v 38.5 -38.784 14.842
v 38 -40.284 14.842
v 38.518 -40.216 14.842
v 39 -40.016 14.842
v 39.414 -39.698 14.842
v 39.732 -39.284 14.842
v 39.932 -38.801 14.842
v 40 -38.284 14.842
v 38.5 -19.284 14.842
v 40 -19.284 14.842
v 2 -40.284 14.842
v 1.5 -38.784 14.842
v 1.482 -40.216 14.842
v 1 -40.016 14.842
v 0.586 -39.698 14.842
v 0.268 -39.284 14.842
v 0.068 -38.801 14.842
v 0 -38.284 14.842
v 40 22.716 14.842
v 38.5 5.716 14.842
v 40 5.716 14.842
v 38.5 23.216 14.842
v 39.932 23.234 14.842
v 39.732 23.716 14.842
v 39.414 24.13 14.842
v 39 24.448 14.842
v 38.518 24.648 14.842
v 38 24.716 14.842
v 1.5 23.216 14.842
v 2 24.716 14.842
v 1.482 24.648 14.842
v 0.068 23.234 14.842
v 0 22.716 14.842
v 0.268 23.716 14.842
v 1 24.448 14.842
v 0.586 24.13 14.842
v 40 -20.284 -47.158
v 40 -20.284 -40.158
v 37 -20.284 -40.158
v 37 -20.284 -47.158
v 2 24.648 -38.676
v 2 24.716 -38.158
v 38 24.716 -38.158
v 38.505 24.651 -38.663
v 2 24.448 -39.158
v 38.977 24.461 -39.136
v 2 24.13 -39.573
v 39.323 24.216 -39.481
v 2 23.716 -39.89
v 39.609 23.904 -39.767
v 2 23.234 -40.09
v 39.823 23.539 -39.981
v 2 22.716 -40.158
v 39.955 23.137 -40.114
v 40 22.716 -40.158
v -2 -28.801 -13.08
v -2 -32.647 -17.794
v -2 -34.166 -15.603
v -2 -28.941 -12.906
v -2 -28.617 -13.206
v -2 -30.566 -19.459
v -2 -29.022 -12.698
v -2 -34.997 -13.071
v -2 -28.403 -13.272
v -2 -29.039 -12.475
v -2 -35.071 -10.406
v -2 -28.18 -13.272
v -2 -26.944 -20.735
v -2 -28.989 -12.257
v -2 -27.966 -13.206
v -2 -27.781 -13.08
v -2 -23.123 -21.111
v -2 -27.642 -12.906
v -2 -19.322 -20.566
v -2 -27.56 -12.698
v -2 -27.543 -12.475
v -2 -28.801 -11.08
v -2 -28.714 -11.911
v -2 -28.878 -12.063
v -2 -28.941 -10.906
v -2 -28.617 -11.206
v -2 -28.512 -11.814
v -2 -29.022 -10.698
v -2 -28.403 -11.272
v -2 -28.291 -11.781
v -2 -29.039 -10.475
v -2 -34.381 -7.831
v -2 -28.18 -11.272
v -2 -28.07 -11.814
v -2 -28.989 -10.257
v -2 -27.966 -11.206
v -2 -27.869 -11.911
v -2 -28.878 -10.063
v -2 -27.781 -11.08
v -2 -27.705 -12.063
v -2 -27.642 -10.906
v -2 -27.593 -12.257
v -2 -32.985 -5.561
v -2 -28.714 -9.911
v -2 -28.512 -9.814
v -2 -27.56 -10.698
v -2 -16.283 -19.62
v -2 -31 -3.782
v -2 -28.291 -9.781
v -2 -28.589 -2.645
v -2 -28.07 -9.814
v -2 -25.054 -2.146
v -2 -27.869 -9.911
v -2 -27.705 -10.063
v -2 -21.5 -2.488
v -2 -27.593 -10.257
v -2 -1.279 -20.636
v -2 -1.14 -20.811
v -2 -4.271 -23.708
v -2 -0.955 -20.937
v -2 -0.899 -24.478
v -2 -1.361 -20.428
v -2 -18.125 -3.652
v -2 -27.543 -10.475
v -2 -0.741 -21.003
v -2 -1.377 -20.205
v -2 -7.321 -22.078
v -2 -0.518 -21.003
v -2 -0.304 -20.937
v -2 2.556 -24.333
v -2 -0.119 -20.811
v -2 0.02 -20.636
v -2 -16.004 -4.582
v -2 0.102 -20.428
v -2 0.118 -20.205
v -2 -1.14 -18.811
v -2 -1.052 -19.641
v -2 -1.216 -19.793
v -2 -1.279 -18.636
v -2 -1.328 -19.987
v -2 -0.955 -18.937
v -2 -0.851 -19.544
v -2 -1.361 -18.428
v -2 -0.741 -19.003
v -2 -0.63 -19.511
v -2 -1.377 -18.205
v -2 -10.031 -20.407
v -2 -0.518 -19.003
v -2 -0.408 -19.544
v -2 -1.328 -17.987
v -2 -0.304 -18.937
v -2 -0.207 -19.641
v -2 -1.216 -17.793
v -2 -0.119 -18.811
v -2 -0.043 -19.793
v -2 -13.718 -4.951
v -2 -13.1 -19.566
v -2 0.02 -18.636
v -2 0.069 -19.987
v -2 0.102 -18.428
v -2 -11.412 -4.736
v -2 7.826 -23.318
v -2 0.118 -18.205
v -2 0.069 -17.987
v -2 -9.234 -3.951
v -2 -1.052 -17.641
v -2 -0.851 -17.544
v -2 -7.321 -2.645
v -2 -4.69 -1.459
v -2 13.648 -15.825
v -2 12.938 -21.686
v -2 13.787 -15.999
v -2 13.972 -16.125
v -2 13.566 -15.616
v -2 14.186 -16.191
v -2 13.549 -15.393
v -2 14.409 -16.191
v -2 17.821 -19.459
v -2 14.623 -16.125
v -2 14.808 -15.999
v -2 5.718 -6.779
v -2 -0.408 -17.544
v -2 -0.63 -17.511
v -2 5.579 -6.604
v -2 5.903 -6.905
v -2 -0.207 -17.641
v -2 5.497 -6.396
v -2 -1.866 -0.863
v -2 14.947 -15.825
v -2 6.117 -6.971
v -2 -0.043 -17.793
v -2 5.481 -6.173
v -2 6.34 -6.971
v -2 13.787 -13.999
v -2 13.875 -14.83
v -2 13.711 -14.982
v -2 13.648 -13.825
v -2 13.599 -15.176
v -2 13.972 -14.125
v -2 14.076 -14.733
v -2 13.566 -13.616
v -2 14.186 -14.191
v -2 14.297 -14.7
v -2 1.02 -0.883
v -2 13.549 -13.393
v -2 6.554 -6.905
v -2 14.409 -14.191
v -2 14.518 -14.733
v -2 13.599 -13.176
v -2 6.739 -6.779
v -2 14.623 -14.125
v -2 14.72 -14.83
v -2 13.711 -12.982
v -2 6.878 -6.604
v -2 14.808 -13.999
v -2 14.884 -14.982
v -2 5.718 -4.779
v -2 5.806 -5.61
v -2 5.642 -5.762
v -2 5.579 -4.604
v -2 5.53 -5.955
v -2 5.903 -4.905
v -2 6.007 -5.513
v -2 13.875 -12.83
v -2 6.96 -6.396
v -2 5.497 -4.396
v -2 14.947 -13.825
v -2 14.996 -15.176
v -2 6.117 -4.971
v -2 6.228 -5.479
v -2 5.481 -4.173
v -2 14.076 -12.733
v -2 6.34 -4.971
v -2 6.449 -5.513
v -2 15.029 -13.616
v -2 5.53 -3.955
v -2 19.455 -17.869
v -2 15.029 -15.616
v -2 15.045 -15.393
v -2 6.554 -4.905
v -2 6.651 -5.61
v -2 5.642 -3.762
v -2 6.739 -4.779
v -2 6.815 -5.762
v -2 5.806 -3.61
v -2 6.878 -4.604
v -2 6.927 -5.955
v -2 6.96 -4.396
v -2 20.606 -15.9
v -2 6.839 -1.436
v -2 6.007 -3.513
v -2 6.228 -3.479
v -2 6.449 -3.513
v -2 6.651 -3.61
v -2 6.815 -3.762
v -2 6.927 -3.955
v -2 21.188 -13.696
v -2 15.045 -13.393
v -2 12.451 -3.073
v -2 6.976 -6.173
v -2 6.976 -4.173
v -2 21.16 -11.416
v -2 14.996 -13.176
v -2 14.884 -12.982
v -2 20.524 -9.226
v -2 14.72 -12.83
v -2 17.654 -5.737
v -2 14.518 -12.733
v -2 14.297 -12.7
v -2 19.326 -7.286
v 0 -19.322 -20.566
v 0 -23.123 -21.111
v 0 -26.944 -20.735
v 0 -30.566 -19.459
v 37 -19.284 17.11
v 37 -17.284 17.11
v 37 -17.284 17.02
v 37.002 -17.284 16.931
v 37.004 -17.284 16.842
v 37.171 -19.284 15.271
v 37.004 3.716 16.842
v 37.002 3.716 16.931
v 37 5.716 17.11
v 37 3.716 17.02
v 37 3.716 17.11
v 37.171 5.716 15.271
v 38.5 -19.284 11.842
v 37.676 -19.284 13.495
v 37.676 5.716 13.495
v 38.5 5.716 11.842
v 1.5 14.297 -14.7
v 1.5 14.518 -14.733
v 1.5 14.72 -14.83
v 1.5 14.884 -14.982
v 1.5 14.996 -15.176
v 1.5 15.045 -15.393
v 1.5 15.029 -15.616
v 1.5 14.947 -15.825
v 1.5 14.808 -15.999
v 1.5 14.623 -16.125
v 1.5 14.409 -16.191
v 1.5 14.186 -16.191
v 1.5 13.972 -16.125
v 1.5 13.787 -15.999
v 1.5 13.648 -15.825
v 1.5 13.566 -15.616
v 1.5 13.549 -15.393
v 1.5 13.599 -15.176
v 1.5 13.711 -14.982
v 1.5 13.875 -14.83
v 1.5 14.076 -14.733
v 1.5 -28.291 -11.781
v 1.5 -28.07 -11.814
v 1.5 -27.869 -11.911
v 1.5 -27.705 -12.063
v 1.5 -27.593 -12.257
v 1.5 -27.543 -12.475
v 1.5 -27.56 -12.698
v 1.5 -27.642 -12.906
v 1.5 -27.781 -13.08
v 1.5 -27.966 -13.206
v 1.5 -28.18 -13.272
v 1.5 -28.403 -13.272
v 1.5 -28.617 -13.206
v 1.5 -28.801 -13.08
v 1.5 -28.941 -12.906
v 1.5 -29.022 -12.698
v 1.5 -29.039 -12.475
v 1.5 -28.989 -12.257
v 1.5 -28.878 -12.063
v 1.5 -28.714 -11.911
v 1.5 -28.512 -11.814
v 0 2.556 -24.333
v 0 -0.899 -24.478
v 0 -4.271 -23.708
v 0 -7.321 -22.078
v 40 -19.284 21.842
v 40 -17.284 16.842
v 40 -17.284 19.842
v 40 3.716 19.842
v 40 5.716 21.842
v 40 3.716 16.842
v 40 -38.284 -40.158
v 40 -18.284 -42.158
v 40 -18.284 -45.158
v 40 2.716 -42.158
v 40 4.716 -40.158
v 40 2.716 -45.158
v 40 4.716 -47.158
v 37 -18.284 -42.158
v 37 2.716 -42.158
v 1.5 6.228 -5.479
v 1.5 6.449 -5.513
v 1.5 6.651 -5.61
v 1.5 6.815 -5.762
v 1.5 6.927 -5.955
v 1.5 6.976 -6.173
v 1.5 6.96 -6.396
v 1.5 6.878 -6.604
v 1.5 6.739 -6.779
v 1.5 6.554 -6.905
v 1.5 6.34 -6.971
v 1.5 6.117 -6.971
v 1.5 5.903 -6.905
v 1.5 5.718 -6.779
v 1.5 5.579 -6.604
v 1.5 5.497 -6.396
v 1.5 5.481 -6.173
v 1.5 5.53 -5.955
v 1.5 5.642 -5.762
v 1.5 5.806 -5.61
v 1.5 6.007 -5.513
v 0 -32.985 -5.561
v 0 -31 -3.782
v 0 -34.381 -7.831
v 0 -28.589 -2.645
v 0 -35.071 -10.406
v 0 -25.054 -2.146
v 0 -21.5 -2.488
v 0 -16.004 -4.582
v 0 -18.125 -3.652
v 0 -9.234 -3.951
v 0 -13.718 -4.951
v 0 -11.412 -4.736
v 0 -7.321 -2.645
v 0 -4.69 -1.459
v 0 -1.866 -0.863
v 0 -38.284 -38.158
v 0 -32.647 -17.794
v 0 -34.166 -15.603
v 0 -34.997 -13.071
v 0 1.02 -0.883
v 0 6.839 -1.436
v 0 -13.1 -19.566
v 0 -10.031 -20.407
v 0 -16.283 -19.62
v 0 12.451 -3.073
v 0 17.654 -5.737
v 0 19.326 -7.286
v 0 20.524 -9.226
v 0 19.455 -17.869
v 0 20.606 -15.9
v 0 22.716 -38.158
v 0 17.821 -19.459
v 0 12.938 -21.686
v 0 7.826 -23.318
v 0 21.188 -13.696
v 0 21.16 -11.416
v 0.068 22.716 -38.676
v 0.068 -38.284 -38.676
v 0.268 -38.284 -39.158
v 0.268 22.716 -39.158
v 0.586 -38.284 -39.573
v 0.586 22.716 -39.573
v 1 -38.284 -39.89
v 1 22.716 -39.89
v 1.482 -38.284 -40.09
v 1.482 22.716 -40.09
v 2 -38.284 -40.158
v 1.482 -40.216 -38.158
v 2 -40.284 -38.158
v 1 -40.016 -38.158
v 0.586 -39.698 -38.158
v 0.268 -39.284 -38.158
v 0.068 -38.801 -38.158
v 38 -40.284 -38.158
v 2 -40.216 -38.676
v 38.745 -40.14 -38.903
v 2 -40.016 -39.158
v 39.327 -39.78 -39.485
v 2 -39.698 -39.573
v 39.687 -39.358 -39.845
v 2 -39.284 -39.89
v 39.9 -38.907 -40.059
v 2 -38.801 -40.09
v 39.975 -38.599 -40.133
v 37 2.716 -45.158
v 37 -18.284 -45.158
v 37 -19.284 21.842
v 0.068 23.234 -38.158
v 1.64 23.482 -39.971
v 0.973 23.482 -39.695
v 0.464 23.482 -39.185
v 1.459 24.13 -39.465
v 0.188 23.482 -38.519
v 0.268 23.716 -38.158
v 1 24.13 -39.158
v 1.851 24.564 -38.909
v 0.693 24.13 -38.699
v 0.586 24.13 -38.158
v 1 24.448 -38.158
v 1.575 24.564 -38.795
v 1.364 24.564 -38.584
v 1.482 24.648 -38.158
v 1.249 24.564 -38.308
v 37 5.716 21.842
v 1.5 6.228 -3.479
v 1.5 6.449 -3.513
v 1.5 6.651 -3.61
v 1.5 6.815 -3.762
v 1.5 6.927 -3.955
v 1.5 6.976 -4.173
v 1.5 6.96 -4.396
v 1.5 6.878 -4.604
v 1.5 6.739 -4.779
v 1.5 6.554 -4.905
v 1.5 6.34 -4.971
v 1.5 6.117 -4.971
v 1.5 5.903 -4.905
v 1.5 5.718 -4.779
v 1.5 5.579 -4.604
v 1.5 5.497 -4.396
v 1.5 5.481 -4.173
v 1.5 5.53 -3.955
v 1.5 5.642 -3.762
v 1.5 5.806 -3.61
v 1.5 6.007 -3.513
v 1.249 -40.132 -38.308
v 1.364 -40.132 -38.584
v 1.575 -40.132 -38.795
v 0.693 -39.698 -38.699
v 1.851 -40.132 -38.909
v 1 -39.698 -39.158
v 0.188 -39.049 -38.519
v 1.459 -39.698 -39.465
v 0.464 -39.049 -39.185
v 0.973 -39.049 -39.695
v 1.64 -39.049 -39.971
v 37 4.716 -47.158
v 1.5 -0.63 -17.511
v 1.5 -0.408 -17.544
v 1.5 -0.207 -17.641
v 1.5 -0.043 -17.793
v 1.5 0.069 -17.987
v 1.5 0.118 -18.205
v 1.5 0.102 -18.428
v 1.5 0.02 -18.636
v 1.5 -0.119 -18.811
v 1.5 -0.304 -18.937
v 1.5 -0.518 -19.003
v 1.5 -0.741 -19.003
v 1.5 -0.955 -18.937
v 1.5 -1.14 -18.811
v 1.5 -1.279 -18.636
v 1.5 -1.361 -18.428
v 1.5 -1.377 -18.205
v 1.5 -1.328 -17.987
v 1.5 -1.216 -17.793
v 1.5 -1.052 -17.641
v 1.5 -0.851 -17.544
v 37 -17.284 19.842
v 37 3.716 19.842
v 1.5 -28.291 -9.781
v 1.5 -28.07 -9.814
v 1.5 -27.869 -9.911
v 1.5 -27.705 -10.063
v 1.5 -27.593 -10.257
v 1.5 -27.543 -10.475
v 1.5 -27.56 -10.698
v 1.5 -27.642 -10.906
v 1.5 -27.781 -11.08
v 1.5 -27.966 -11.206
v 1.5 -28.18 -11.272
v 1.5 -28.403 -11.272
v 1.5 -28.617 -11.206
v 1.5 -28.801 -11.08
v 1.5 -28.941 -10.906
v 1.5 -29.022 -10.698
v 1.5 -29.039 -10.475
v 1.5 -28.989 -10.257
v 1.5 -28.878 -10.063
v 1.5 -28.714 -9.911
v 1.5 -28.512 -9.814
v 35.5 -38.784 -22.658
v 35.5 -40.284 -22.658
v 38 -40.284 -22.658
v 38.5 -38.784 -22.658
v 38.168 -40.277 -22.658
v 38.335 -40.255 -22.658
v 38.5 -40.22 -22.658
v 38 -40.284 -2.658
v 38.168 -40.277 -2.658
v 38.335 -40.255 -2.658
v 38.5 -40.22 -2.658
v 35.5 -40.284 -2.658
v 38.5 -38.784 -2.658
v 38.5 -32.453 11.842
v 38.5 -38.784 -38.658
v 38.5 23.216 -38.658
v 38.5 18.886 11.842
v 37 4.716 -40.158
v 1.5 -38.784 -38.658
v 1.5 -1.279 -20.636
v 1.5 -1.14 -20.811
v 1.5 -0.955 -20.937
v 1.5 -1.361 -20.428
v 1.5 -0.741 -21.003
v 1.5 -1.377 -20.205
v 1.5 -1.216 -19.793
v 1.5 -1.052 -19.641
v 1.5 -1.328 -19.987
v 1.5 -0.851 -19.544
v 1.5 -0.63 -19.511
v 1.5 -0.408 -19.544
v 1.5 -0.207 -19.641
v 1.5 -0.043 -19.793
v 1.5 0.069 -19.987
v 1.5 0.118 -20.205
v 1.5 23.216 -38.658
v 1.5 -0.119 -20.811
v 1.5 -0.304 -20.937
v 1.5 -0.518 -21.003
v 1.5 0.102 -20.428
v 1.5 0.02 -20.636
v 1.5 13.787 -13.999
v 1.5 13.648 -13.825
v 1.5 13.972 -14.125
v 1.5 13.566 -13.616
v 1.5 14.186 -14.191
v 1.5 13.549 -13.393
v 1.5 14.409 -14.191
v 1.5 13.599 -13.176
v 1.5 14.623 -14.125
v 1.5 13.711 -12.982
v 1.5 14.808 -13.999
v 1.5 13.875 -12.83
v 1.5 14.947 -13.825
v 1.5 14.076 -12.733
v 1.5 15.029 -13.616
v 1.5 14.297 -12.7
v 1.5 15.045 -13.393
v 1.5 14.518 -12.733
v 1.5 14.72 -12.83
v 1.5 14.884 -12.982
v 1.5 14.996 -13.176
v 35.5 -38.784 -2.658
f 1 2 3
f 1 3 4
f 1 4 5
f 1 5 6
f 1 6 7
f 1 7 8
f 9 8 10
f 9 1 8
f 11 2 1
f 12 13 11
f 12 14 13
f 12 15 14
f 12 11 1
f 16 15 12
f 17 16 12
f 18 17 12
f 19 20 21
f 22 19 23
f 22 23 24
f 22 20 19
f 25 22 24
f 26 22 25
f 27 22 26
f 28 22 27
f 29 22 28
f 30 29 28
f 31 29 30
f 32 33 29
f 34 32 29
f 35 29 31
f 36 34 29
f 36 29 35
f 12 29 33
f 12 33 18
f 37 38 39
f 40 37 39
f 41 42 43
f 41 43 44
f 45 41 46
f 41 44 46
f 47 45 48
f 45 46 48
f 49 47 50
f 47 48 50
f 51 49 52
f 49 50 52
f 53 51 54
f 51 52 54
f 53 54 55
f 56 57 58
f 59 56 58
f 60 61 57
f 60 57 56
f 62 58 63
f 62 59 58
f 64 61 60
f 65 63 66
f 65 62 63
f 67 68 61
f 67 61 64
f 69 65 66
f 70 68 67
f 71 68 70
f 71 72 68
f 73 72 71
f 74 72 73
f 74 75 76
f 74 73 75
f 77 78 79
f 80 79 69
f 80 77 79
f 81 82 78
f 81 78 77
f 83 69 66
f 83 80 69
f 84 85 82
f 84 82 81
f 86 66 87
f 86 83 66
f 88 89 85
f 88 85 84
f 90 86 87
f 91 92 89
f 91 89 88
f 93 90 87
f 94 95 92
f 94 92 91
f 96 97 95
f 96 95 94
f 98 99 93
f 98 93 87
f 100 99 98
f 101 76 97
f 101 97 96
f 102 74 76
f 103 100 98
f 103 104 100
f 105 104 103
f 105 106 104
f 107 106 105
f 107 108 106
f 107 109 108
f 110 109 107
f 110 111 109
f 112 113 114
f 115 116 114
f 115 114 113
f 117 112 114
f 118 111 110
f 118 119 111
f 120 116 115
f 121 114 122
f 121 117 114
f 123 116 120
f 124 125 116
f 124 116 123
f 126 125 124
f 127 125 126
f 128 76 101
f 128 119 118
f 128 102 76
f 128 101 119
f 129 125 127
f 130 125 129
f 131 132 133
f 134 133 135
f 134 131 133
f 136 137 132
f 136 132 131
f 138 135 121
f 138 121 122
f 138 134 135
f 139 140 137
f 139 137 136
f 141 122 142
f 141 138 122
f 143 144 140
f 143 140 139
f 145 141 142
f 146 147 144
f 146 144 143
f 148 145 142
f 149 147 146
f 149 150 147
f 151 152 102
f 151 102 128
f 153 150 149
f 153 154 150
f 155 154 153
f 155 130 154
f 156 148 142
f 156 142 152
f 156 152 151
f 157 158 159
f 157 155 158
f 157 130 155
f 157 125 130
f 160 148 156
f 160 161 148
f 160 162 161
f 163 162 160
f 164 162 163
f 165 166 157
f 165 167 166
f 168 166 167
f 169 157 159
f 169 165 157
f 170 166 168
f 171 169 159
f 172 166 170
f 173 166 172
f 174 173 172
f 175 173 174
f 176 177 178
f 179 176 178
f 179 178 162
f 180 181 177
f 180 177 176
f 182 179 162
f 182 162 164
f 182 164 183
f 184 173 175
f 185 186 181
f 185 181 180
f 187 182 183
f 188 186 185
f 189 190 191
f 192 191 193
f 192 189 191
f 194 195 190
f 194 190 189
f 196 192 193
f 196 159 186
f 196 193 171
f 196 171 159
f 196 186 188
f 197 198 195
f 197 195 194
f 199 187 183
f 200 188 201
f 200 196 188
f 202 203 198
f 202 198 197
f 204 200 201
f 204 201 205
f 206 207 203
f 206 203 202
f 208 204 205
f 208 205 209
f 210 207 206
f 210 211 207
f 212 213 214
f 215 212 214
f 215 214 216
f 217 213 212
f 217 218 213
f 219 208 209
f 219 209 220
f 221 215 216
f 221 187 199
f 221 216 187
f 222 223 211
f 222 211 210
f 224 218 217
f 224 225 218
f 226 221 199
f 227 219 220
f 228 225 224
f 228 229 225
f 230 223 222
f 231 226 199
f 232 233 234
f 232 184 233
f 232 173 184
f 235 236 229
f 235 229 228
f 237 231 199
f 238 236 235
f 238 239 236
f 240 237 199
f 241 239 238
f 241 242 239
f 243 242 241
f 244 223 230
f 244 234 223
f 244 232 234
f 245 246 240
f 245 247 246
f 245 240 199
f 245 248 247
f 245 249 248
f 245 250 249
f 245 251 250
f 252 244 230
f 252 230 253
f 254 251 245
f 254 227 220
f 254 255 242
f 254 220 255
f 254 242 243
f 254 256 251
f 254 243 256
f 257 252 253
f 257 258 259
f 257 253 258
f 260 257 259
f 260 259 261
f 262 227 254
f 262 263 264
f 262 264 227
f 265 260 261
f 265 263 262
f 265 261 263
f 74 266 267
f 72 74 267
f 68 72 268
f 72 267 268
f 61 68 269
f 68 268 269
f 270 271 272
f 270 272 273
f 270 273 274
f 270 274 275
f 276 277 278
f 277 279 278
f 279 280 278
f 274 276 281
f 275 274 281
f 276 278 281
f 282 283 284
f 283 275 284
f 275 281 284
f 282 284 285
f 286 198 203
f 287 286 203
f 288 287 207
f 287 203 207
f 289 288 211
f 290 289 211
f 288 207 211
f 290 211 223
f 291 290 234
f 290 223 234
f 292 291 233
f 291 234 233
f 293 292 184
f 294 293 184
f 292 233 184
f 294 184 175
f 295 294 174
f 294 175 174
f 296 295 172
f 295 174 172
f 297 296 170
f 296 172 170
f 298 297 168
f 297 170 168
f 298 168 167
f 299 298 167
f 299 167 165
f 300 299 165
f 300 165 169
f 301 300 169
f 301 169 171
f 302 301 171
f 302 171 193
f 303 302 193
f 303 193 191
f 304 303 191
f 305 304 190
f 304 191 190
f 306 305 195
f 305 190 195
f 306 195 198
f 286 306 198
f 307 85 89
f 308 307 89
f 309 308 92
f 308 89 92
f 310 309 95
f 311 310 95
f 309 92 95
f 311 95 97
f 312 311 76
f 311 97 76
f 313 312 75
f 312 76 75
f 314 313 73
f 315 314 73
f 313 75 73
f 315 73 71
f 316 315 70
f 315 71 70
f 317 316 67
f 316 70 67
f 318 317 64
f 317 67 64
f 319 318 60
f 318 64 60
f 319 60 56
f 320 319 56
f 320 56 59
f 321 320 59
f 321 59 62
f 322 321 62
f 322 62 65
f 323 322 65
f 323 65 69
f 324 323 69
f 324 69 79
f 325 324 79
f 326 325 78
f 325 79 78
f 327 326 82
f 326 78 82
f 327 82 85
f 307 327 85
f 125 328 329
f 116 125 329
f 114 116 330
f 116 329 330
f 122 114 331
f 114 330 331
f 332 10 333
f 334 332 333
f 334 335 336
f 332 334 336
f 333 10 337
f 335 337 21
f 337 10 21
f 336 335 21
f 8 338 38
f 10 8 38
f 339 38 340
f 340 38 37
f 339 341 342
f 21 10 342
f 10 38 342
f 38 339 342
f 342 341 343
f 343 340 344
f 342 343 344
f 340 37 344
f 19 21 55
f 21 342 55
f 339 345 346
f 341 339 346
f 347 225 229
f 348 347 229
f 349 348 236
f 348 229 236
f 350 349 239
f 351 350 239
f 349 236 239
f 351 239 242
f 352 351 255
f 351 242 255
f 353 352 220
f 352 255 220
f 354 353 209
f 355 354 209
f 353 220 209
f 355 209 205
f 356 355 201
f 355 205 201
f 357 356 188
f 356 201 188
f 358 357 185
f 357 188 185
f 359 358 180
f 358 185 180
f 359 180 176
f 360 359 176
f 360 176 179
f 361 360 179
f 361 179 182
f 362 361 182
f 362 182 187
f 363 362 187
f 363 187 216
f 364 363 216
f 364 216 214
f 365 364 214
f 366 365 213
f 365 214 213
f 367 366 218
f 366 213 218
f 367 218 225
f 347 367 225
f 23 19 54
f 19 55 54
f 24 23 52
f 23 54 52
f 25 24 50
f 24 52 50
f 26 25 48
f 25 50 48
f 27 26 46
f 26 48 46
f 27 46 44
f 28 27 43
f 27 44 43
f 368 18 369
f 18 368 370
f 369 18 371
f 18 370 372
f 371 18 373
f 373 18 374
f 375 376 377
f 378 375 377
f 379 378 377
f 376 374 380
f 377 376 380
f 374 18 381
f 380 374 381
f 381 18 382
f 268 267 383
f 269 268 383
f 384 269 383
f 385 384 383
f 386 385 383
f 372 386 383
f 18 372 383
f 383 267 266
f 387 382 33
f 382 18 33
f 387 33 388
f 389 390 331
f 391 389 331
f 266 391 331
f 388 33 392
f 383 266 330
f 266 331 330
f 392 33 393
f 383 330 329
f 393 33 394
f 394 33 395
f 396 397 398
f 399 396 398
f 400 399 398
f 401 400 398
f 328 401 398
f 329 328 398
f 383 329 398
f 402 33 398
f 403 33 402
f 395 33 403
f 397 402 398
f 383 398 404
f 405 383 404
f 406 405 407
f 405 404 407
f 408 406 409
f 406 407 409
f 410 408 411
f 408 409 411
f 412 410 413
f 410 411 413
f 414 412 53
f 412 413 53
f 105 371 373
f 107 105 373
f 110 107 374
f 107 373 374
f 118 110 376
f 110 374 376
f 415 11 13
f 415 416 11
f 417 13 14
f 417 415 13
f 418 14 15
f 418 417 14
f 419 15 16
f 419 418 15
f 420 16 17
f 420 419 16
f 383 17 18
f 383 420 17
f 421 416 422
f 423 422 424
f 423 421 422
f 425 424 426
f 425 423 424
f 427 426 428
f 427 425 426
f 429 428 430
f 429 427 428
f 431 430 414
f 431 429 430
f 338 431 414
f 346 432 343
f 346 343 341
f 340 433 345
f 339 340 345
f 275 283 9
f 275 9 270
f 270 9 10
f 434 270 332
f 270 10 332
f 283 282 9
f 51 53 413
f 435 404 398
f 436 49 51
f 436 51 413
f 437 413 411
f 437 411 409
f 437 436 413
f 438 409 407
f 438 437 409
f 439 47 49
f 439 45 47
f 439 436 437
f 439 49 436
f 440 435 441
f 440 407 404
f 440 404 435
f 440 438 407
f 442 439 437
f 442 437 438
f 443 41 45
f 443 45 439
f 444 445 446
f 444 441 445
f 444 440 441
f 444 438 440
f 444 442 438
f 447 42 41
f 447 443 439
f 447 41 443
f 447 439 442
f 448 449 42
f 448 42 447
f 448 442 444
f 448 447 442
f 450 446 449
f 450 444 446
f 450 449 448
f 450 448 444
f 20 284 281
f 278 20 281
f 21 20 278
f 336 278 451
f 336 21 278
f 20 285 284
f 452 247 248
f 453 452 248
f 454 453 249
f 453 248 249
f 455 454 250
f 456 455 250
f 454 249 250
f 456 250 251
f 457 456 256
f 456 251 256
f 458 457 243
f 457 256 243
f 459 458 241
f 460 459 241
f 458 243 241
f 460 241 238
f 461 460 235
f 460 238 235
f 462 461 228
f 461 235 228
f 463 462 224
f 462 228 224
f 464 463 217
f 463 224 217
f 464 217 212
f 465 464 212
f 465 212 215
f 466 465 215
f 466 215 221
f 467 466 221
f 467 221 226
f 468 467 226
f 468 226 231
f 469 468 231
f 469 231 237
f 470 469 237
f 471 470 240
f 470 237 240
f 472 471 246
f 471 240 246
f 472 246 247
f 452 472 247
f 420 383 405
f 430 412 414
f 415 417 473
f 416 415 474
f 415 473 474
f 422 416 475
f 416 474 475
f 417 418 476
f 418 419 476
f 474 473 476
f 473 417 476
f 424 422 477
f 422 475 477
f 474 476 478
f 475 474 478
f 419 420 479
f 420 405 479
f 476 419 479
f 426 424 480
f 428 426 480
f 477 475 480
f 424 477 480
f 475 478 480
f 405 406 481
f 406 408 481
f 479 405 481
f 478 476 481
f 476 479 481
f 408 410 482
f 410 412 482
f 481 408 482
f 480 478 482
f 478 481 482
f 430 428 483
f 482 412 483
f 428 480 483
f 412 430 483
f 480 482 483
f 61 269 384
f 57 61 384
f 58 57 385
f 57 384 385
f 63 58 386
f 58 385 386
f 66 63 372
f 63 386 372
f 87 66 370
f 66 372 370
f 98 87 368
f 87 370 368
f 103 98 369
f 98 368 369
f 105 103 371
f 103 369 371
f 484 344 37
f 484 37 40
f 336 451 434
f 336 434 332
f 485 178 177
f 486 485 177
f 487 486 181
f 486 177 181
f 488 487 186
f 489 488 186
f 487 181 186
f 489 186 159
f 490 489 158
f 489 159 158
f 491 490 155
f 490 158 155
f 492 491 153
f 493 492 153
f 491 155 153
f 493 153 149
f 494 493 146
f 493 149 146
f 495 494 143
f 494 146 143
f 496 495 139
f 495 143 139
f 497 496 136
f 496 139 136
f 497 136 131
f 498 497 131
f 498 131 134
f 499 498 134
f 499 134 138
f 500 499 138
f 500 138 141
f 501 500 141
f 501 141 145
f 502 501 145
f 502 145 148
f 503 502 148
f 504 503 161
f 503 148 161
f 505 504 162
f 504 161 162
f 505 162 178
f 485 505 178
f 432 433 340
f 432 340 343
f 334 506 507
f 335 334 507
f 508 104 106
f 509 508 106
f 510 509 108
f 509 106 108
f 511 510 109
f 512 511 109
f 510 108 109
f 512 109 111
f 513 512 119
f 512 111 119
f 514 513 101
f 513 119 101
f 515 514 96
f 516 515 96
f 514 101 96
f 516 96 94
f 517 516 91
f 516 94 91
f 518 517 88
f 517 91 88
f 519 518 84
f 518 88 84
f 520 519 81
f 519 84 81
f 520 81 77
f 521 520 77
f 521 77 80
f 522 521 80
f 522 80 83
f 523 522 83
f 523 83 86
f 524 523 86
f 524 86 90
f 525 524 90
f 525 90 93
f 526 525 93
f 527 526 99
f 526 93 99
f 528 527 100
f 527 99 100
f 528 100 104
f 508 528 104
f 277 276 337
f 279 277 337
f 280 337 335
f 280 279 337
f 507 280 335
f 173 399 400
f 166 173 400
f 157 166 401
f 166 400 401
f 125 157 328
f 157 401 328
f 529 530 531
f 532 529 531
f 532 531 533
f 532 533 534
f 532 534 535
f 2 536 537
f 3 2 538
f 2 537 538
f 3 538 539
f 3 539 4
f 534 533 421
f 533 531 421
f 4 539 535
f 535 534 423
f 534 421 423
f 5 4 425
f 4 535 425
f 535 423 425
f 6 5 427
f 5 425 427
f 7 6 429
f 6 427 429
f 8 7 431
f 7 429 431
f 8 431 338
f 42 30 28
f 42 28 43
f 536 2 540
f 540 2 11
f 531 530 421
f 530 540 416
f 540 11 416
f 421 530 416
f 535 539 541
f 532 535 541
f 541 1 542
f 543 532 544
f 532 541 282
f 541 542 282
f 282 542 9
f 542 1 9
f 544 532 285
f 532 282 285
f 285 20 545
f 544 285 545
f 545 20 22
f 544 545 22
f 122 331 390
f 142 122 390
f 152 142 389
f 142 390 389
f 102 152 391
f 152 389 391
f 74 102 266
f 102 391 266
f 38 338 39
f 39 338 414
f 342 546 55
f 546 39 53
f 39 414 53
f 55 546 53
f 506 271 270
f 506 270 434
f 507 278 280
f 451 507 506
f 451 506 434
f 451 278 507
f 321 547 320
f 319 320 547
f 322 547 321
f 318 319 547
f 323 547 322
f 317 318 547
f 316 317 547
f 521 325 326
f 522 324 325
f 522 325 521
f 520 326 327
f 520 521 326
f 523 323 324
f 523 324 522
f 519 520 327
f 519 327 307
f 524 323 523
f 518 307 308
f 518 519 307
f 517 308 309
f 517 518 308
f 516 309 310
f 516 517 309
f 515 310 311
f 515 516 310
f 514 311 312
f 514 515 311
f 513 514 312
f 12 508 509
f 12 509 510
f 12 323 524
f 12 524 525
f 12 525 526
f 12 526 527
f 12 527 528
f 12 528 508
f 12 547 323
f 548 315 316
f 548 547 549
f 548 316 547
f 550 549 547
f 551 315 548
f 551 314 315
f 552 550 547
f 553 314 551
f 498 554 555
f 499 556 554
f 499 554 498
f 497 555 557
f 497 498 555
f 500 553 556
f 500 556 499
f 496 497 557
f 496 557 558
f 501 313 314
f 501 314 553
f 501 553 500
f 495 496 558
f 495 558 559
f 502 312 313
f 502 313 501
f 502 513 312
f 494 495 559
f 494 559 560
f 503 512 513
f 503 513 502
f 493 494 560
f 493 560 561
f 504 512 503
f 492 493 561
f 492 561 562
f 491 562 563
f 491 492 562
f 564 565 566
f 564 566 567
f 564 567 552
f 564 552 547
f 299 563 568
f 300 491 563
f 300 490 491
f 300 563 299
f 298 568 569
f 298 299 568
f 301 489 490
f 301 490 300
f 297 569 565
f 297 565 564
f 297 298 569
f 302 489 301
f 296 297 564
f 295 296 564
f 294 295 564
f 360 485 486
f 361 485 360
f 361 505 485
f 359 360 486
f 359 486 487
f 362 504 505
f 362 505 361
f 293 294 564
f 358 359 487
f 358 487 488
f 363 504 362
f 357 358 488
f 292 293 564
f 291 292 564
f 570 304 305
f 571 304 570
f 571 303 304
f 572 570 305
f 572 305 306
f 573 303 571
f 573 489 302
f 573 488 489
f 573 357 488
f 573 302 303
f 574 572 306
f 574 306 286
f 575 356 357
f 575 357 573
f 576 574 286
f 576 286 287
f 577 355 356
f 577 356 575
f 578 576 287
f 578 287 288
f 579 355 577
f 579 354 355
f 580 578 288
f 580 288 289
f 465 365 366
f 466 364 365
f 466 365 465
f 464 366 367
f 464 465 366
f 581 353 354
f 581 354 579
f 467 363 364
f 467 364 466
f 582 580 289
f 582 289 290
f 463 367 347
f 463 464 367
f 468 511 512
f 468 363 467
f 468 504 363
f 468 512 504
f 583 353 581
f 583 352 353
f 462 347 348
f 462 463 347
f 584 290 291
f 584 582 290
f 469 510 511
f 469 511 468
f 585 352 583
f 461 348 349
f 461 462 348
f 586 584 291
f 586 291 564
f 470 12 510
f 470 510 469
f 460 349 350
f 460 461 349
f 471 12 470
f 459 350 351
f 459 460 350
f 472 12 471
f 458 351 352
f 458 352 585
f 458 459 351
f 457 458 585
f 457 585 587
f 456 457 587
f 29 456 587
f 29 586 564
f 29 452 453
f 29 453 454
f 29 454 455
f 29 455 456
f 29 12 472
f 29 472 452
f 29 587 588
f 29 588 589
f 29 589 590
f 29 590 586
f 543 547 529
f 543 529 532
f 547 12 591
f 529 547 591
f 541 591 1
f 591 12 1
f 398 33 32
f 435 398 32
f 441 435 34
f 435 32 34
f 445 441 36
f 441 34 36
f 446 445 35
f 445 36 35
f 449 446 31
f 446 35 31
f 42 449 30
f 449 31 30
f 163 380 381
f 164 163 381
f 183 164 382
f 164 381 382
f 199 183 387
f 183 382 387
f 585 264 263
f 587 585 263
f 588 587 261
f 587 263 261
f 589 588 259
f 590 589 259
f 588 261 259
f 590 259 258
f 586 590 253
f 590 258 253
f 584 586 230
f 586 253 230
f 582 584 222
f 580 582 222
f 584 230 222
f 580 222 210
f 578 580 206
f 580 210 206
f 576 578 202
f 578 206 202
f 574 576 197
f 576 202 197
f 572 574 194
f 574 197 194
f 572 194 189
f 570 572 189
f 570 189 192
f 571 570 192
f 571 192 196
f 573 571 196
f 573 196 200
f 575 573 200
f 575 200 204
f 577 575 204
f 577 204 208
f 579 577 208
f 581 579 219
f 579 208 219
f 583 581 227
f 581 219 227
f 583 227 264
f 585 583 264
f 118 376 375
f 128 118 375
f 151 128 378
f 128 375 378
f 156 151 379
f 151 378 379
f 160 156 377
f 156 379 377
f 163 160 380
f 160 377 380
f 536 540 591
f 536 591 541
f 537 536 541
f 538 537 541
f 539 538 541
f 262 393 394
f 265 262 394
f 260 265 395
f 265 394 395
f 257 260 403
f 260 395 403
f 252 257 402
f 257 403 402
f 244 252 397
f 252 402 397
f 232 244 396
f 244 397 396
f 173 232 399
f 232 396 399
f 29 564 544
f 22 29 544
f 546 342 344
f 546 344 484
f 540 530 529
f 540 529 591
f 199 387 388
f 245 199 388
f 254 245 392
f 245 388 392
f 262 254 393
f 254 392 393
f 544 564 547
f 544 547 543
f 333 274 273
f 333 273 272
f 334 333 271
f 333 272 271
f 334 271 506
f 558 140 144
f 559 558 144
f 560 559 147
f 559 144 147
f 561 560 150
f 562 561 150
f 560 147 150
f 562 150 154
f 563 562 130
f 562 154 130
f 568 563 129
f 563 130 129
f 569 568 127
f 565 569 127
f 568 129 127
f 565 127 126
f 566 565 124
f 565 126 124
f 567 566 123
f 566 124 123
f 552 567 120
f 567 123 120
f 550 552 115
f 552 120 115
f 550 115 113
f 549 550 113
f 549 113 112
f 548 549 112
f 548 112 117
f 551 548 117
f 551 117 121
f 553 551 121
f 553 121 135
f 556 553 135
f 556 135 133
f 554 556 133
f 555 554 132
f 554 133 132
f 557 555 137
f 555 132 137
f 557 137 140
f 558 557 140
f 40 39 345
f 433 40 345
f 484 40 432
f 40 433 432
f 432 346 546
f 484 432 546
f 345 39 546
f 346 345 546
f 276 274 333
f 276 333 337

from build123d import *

# Parameters (mm, degrees)
SKETCH1_W           = 55
SKETCH1_H           = 65
BOSS_EXTRUDE1_DEPTH = 40
SKETCH2_W           = 37
SKETCH2_H           = 62
CUT_EXTRUDE1_DEPTH  = 53.5
FILLET1_R           = 2
FILLET7_R           = 2
BOSS_EXTRUDE2_DEPTH = 2
SKETCH17_R          = 0.75
CUT_EXTRUDE3_DEPTH  = 3.5
SKETCH18_W          = 3
SKETCH18_H          = 25
BOSS_EXTRUDE3_DEPTH = 7
SKETCH19_W          = 3
SKETCH19_H          = 25
BOSS_EXTRUDE4_DEPTH = 7
SKETCH22_W          = 3
SKETCH22_H          = 25
BOSS_EXTRUDE5_DEPTH = 1.5
SKETCH23_W          = 3
SKETCH23_H          = 21
CUT_EXTRUDE4_DEPTH  = 3
FILLET9_R           = 10
SKETCH24_W          = 3
SKETCH24_H          = 20
CUT_EXTRUDE5_DEPTH  = 5


with BuildPart() as part:
    # Sketch1 → Boss-Extrude1 (new body)
    with BuildSketch(Plane(origin=(0, 0, 0), x_dir=(0, 0, -1), z_dir=(1, 0, 0))):
        with Locations((12.658301158, -7.783783784)):
            Rectangle(SKETCH1_W, SKETCH1_H)
    extrude(amount=BOSS_EXTRUDE1_DEPTH)

    # Sketch2 → Cut-Extrude1 (cut)
    with BuildSketch(Plane.XY.offset(14.841698842)):
        with Locations((20, -7.783783784)):
            Rectangle(SKETCH2_W, SKETCH2_H)
    extrude(amount=-CUT_EXTRUDE1_DEPTH, mode=Mode.SUBTRACT)

    # Fillet1
    fillet1_edges = [part.edges().sort_by_distance(p)[0] for p in [
        (40, 24.716216216, -12.658301158),
        (0, -7.783783784, -40.158301158),
        (0, -40.283783784, -12.658301158),
        (20, 24.716216216, -40.158301158),
        (20, -40.283783784, -40.158301158),
        (40, -40.283783784, -12.658301158),
    ]]
    fillet(fillet1_edges, radius=FILLET1_R)

    # Fillet7
    # the kernel refuses this fillet: 2 mm, written as the material it takes off along each edge
    with BuildSketch(Plane(origin=(2, 22.716216216, -38.158301158), x_dir=(-1, 0, 0), z_dir=(0, 1, 0))) as fillet7_piece_1_section:
        Polygon((0, 0), (FILLET7_R, 0), (FILLET7_R, -FILLET7_R), (0, -FILLET7_R), align=None)
    fillet7_piece_1 = extrude(amount=FILLET7_R, mode=Mode.PRIVATE)
    fillet7_piece_1 = fillet7_piece_1 - Plane(origin=(2, 22.716216216, -38.158301158), x_dir=(0.7071067811865475, 0, 0.7071067811865475), z_dir=(0, 1, 0)) * Sphere(FILLET7_R, mode=Mode.PRIVATE)
    add(fillet7_piece_1, mode=Mode.SUBTRACT)
    with BuildSketch(Plane(origin=(0, 24.716216216, 19.841698842), x_dir=(1, 0, 0), z_dir=(0, 0, -1))) as fillet7_piece_2:
        with BuildLine():
            CenterArc((FILLET7_R, FILLET7_R), FILLET7_R, 180, 90)
            Line((0, FILLET7_R), (0, 0))
            Line((0, 0), (FILLET7_R, 0))
        make_face()
    extrude(amount=58, mode=Mode.SUBTRACT)

    # Sketch16 → Boss-Extrude2 (add)
    with BuildSketch(Plane.ZY):
        with BuildLine():
            ThreePointArc((-5.736624698, 17.653603477), (-12.555029292, 21.251157673), (-19.459260578, 17.82119736))
            ThreePointArc((-19.459260578, 17.82119736), (-22.577953623, 10.406366019), (-24.332801521, 2.556112585))
            ThreePointArc((-24.332801521, 2.556112585), (-24.205542572, -2.611001185), (-22.077609894, -7.321326234))
            ThreePointArc((-22.077609894, -7.321326234), (-19.565557127, -13.10020976), (-20.565766521, -19.321583006))
            ThreePointArc((-20.565766521, -19.321583006), (-21.037839736, -25.044648424), (-19.459260578, -30.565918092))
            ThreePointArc((-19.459260578, -30.565918092), (-10.406141283, -35.070804577), (-2.644818813, -28.588918684))
            ThreePointArc((-2.644818813, -28.588918684), (-2.212041027, -23.266864026), (-3.652018787, -18.125071882))
            ThreePointArc((-3.652018787, -18.125071882), (-4.916354141, -12.558379885), (-2.644818813, -7.321326234))
            ThreePointArc((-2.644818813, -7.321326234), (-1.085145754, -3.293973241), (-0.88318994, 1.020116006))
            ThreePointArc((-0.88318994, 1.020116006), (-2.121330664, 9.683670911), (-5.736624698, 17.653603477))
        make_face()
    extrude(amount=BOSS_EXTRUDE2_DEPTH)

    # Sketch17 → Cut-Extrude3 (cut)
    with BuildSketch(Plane.ZY.offset(2)):
        with Locations((-15.44953453, 14.297400207)):
            Circle(SKETCH17_R)
        with Locations((-13.44953453, 14.297400207)):
            Circle(SKETCH17_R)
        with Locations((-4.229257303, 6.228419053)):
            Circle(SKETCH17_R)
        with Locations((-6.229257303, 6.228419053)):
            Circle(SKETCH17_R)
        with Locations((-20.261021777, -0.629536007)):
            Circle(SKETCH17_R)
        with Locations((-18.261021777, -0.629536007)):
            Circle(SKETCH17_R)
        with Locations((-12.530672595, -28.291294223)):
            Circle(SKETCH17_R)
        with Locations((-10.530672595, -28.291294223)):
            Circle(SKETCH17_R)
    extrude(amount=-CUT_EXTRUDE3_DEPTH, mode=Mode.SUBTRACT)

    # Sketch18 → Boss-Extrude3 (add)
    with BuildSketch(Plane(origin=(0, 0, -40.158301158), x_dir=(-1, 0, 0), z_dir=(0, 0, -1))):
        with Locations((-38.5, -7.783783784)):
            Rectangle(SKETCH18_W, SKETCH18_H)
    extrude(amount=BOSS_EXTRUDE3_DEPTH)

    # Sketch19 → Boss-Extrude4 (add)
    with BuildSketch(Plane.XY.offset(14.841698842)):
        with Locations((38.5, -6.783783784)):
            Rectangle(SKETCH19_W, SKETCH19_H)
    extrude(amount=BOSS_EXTRUDE4_DEPTH)

    # Sketch22 → Boss-Extrude5 (add)
    with BuildSketch(Plane.ZY.offset(-38.5)):
        with Locations((13.341698842, -6.783783784)):
            Rectangle(SKETCH22_W, SKETCH22_H)
    extrude(amount=BOSS_EXTRUDE5_DEPTH)

    # Sketch23 → Cut-Extrude4 (cut)
    with BuildSketch(Plane.ZY.offset(-37)):
        with Locations((-43.658301158, -7.783783784)):
            Rectangle(SKETCH23_W, SKETCH23_H)
        with Locations((18.341698842, -6.783783784)):
            Rectangle(SKETCH23_W, SKETCH23_H)
    extrude(amount=-CUT_EXTRUDE4_DEPTH, mode=Mode.SUBTRACT)

    # Fillet9
    # the kernel refuses this fillet: 10 mm, written as the material it takes off along each edge
    with BuildSketch(Plane(origin=(37, 18.885783407, 11.841698842), x_dir=(0, 0, 1), z_dir=(0, -1, 0))) as fillet9_piece_1:
        with BuildLine():
            CenterArc((5.267826876, -10), FILLET9_R, 90, 31.788330617)
            Line((0, -1.5), (-0.105356538, -1.33))
            ThreePointArc((-0.105356538, -1.33), (-0.2, -0.75), (-0.2, 0))
            Line((-0.2, 0), (0, 0.2))
            Line((0, 0.2), (5.267826876, 0.2))
            Line((5.267826876, 0.2), (5.267826876, 0))
        make_face()
    extrude(amount=51.339134382, mode=Mode.SUBTRACT)

    # Sketch24 → Cut-Extrude5 (cut)
    with BuildSketch(Plane.XZ.offset(40.283783784)):
        with Locations((37, -12.658301158)):
            Rectangle(SKETCH24_W, SKETCH24_H)
    extrude(amount=-CUT_EXTRUDE5_DEPTH, mode=Mode.SUBTRACT)


solid = part.part
